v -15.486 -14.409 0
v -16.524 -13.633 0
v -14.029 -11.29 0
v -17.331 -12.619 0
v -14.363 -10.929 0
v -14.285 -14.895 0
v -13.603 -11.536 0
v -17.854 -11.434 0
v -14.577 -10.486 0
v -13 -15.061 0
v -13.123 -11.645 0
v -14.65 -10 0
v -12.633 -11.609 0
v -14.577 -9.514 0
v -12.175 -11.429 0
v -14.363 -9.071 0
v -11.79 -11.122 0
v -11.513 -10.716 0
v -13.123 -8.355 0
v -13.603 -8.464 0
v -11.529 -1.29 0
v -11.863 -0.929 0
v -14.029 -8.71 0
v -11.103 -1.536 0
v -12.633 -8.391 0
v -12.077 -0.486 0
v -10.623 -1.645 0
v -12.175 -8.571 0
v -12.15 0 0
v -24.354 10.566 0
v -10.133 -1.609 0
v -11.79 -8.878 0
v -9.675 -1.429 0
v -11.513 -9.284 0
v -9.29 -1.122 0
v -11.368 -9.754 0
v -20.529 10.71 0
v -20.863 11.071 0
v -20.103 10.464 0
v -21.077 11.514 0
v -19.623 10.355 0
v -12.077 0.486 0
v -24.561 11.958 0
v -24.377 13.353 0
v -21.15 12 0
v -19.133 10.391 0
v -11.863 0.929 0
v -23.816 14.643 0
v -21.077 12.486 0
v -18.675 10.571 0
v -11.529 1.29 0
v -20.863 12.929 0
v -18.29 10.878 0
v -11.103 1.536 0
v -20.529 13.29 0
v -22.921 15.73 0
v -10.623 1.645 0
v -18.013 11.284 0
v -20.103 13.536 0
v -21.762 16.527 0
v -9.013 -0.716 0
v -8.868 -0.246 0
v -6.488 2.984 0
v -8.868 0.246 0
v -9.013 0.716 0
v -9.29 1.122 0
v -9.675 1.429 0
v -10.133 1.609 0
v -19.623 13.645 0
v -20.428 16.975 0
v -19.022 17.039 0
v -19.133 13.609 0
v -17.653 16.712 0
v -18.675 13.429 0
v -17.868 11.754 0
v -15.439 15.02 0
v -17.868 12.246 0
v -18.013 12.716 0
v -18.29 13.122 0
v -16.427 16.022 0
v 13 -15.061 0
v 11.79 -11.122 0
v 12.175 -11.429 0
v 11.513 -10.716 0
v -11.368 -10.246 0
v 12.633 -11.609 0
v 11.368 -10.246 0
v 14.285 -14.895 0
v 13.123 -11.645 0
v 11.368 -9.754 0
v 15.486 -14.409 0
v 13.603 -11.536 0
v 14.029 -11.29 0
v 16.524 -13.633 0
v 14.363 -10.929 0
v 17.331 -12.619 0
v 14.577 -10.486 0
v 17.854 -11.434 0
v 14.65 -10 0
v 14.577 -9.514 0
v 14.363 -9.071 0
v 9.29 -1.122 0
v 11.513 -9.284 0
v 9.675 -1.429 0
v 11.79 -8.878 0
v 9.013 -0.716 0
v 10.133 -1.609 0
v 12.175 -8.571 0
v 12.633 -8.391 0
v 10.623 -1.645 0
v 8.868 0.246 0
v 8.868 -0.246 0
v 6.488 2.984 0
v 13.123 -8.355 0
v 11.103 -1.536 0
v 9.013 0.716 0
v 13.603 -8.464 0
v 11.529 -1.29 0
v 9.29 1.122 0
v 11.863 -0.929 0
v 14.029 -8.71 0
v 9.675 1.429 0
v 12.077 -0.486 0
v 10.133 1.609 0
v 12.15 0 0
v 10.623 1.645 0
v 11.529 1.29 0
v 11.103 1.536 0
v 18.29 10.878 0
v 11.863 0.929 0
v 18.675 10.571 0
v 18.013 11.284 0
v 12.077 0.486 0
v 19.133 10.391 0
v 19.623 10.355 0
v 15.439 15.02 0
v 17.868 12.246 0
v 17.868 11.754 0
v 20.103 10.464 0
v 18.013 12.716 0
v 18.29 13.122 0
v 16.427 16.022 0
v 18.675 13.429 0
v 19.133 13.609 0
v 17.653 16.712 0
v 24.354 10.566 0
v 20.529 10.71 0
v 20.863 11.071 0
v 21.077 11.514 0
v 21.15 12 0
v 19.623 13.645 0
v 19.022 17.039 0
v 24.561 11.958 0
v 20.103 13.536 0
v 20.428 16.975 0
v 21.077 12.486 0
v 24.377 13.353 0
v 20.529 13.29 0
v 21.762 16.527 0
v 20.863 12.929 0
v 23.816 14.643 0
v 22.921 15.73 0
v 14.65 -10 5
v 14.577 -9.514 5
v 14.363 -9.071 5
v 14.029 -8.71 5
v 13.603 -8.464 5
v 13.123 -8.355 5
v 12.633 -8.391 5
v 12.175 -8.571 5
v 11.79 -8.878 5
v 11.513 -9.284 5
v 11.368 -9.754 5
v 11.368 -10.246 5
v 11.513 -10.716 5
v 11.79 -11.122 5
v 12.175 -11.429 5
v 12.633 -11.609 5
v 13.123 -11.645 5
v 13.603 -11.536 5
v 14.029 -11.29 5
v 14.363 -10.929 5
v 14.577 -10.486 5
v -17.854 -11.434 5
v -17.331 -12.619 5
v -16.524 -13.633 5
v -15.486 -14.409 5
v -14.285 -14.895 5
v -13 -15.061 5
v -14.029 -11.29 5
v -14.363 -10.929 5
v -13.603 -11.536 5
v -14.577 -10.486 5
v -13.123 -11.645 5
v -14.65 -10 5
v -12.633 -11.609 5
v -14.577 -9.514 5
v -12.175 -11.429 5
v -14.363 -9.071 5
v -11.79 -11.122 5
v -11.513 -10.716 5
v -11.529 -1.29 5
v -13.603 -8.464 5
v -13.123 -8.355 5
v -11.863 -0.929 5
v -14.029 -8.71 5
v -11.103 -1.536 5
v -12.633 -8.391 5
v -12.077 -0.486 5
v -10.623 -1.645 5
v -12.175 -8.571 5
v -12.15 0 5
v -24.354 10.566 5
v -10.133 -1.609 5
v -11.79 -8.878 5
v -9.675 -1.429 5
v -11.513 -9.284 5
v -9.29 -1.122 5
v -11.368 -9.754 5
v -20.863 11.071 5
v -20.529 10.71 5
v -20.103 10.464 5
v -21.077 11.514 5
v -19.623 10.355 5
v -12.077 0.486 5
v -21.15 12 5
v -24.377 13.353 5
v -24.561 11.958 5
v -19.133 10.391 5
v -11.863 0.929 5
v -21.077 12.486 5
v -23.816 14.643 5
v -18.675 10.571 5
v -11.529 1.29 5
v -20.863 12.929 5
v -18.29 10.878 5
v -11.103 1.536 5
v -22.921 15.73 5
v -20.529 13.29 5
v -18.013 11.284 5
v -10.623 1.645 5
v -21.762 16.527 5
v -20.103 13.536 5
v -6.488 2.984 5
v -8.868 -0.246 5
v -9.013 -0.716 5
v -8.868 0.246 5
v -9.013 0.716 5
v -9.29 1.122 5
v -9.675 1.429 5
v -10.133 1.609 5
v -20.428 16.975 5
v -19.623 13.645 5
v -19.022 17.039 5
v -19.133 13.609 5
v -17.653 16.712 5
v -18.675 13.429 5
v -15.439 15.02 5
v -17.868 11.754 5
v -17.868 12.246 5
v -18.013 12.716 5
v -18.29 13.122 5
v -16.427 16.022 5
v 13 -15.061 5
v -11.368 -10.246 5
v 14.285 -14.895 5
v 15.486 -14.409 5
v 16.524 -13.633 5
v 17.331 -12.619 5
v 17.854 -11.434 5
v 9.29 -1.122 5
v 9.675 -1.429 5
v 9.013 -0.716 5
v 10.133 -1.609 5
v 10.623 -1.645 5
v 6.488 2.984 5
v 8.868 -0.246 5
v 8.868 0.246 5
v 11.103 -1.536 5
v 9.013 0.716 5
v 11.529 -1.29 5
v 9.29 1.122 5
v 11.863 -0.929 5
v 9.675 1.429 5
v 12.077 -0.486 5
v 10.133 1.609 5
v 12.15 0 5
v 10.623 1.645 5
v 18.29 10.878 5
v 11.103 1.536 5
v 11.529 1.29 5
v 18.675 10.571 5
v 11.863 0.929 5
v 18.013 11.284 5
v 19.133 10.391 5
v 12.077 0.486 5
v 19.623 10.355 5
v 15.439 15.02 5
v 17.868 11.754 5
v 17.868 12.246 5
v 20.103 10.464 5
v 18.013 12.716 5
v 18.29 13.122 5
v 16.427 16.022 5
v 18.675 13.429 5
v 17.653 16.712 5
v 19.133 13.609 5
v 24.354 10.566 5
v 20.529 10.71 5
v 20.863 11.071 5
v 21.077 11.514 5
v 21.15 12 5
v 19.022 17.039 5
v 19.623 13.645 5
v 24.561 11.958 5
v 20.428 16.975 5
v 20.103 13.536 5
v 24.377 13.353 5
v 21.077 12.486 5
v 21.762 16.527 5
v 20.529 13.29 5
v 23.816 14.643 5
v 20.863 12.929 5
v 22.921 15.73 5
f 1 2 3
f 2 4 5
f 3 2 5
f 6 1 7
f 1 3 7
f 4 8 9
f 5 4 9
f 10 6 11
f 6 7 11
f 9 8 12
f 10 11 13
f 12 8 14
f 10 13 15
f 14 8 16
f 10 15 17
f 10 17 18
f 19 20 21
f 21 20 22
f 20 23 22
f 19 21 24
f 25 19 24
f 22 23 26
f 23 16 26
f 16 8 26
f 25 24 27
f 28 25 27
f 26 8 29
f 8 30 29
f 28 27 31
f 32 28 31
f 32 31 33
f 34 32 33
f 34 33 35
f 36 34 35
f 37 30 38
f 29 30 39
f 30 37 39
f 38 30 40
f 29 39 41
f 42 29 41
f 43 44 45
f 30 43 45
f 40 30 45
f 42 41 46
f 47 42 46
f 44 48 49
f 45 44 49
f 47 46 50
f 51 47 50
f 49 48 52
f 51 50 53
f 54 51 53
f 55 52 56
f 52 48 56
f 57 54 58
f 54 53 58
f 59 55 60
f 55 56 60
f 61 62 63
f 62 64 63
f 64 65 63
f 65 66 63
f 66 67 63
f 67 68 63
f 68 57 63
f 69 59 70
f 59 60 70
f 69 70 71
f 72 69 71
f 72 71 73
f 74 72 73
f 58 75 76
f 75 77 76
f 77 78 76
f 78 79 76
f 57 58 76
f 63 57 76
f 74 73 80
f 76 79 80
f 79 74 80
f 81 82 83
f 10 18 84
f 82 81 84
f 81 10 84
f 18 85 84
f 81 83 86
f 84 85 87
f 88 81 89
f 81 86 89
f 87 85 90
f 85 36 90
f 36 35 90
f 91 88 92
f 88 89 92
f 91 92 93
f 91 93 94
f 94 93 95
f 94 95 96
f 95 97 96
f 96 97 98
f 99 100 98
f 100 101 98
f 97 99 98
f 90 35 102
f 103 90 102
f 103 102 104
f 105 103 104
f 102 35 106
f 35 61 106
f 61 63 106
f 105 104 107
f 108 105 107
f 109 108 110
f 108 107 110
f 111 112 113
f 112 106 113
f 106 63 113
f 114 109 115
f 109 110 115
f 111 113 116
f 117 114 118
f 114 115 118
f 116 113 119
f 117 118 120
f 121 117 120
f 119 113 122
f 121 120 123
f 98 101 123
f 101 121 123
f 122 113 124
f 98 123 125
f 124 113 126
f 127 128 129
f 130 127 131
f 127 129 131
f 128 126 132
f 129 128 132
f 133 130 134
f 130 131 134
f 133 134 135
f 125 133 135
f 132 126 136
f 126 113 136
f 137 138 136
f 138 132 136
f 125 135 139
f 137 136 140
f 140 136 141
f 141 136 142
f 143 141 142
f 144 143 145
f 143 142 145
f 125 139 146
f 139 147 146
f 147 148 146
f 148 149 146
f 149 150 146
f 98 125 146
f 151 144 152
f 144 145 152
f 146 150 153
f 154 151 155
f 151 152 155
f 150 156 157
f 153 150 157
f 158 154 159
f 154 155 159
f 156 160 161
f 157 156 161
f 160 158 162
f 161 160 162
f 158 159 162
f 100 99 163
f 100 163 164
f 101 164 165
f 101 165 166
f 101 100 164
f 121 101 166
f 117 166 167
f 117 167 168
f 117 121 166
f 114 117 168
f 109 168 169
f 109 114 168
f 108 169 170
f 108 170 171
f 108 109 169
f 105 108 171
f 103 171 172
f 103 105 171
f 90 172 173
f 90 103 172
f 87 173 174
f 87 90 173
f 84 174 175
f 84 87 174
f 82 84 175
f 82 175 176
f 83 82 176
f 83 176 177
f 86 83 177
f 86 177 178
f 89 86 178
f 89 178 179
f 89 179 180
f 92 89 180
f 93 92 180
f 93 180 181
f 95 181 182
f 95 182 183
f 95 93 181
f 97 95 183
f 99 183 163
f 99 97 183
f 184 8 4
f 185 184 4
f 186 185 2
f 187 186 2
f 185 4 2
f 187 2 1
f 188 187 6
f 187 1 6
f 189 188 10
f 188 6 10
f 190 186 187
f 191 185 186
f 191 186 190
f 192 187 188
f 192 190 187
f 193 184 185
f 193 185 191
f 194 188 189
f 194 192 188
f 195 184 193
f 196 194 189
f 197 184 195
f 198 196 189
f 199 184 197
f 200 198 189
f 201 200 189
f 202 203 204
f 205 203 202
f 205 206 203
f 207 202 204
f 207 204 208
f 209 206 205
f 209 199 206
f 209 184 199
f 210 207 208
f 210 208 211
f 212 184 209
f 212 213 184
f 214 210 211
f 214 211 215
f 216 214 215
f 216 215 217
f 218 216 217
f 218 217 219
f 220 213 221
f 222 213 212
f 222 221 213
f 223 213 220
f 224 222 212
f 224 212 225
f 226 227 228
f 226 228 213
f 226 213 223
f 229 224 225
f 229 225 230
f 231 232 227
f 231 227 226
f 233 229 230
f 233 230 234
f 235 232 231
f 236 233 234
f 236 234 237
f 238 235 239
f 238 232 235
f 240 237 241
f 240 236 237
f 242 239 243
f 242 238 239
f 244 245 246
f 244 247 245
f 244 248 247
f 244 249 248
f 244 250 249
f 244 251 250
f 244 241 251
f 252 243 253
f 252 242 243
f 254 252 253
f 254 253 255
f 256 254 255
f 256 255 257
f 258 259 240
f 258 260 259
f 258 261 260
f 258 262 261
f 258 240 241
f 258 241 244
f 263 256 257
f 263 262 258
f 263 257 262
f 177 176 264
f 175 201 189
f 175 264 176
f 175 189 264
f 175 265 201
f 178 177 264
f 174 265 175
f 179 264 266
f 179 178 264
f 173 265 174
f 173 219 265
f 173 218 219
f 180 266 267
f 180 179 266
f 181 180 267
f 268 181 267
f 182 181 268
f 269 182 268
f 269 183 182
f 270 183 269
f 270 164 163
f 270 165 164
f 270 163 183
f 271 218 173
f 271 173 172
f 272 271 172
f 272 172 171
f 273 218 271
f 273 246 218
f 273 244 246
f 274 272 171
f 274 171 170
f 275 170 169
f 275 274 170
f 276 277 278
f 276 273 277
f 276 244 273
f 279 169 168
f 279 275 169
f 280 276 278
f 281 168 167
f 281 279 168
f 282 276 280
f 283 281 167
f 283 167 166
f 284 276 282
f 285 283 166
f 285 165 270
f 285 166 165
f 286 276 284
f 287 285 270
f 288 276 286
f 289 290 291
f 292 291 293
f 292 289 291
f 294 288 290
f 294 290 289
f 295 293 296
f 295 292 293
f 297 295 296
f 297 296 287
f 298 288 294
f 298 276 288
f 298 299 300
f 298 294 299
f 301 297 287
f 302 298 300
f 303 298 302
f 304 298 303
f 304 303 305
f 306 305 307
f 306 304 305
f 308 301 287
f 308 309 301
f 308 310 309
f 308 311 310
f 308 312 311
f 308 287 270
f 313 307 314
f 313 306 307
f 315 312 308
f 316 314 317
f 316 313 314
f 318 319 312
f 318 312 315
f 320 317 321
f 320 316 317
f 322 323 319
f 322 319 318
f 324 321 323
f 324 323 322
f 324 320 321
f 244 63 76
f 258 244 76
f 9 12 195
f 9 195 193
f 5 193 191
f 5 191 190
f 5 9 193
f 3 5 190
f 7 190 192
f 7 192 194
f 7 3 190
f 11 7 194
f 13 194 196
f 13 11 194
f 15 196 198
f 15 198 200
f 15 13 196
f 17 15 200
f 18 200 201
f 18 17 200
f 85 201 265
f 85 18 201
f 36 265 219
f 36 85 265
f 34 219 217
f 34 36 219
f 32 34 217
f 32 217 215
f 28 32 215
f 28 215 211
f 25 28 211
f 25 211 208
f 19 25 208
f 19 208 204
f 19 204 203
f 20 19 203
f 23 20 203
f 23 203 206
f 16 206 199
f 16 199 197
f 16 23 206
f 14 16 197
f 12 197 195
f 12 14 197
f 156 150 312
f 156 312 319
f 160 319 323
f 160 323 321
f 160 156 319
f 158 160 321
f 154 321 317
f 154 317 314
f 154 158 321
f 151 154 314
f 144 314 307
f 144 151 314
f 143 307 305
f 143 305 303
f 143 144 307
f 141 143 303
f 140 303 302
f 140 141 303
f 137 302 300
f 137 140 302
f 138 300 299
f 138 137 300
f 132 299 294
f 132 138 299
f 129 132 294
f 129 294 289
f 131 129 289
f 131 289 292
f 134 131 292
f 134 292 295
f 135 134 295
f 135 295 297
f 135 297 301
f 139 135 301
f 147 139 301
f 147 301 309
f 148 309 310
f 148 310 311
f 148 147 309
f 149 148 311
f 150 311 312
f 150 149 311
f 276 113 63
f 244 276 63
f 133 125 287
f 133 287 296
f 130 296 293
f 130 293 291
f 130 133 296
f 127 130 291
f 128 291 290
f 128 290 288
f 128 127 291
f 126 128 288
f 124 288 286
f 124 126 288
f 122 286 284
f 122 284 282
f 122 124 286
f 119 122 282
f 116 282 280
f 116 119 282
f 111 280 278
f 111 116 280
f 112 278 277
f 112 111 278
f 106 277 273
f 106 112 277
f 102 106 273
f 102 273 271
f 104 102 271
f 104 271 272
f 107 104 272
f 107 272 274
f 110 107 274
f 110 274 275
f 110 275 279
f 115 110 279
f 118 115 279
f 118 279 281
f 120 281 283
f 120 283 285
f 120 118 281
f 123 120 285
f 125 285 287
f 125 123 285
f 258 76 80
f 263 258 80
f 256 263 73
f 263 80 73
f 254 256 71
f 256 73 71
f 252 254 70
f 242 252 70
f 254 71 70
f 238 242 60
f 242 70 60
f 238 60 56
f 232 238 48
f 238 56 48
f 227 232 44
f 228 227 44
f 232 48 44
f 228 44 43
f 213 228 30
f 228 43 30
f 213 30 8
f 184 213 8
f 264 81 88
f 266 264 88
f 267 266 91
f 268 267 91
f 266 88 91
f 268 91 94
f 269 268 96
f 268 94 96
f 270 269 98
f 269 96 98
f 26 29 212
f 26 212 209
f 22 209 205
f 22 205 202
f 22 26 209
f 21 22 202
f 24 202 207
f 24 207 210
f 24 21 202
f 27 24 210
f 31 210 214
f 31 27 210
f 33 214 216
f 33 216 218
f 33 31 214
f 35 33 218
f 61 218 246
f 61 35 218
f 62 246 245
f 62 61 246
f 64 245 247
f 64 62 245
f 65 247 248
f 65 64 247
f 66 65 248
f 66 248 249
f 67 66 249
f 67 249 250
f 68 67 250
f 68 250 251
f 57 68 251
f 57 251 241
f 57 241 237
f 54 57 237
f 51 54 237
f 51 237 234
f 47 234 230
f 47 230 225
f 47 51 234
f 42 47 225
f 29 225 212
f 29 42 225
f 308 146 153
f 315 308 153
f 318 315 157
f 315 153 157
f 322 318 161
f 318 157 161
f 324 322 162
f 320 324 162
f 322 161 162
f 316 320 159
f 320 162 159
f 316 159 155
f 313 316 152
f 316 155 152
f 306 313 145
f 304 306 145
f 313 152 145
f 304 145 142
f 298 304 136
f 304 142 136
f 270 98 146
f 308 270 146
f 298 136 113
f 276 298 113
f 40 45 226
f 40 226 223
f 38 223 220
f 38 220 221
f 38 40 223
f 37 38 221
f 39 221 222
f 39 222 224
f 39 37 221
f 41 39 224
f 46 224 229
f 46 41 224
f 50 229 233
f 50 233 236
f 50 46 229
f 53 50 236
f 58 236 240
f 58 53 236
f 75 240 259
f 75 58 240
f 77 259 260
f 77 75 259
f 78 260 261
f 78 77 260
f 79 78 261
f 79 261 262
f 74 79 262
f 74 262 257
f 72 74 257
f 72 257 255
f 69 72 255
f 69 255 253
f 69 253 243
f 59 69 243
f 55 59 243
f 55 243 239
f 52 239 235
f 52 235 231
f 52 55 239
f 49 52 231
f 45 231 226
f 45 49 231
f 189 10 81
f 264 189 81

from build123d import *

# Parameters (mm, degrees)
SZKIC1_R                    = 1.65
DODANIE_WYCI_GNI_CIE1_DEPTH = 5


with BuildPart() as part:
    # Szkic1 → Dodanie-wyciągnięcie1 (new body)
    with BuildSketch(Plane.XY):
        with BuildLine():
            Line((17.853722756, -11.434054451), (24.353722756, 10.565945549))
            ThreePointArc((24.353722756, 10.565945549), (21.762078084, 16.527487106), (15.438744243, 15.020155366))
            Line((15.438744243, 15.020155366), (6.487805254, 2.983671115))
            Line((6.487805254, 2.983671115), (-6.487805254, 2.983671115))
            Line((-6.487805254, 2.983671115), (-15.438744243, 15.020155366))
            ThreePointArc((-15.438744243, 15.020155366), (-21.762078084, 16.527487106), (-24.353722756, 10.565945549))
            Line((-24.353722756, 10.565945549), (-17.853722756, -11.434054451))
            ThreePointArc((-17.853722756, -11.434054451), (-16.029619333, -14.054200717), (-13, -15.061139867))
            Line((-13, -15.061139867), (13, -15.061139867))
            ThreePointArc((13, -15.061139867), (16.029619333, -14.054200717), (17.853722756, -11.434054451))
        make_face()
        with Locations((10.5, 0)):
            Circle(SZKIC1_R, mode=Mode.SUBTRACT)
        with Locations((19.5, 12)):
            Circle(SZKIC1_R, mode=Mode.SUBTRACT)
        with Locations((13, -10)):
            Circle(SZKIC1_R, mode=Mode.SUBTRACT)
        with Locations(Location((-13, -10, 0), (0, 0, 180))):
            Circle(SZKIC1_R, mode=Mode.SUBTRACT)
        with Locations(Location((-19.5, 12, 0), (0, 0, 180))):
            Circle(SZKIC1_R, mode=Mode.SUBTRACT)
        with Locations(Location((-10.5, 0, 0), (0, 0, 180))):
            Circle(SZKIC1_R, mode=Mode.SUBTRACT)
    extrude(amount=DODANIE_WYCI_GNI_CIE1_DEPTH)


solid = part.part
